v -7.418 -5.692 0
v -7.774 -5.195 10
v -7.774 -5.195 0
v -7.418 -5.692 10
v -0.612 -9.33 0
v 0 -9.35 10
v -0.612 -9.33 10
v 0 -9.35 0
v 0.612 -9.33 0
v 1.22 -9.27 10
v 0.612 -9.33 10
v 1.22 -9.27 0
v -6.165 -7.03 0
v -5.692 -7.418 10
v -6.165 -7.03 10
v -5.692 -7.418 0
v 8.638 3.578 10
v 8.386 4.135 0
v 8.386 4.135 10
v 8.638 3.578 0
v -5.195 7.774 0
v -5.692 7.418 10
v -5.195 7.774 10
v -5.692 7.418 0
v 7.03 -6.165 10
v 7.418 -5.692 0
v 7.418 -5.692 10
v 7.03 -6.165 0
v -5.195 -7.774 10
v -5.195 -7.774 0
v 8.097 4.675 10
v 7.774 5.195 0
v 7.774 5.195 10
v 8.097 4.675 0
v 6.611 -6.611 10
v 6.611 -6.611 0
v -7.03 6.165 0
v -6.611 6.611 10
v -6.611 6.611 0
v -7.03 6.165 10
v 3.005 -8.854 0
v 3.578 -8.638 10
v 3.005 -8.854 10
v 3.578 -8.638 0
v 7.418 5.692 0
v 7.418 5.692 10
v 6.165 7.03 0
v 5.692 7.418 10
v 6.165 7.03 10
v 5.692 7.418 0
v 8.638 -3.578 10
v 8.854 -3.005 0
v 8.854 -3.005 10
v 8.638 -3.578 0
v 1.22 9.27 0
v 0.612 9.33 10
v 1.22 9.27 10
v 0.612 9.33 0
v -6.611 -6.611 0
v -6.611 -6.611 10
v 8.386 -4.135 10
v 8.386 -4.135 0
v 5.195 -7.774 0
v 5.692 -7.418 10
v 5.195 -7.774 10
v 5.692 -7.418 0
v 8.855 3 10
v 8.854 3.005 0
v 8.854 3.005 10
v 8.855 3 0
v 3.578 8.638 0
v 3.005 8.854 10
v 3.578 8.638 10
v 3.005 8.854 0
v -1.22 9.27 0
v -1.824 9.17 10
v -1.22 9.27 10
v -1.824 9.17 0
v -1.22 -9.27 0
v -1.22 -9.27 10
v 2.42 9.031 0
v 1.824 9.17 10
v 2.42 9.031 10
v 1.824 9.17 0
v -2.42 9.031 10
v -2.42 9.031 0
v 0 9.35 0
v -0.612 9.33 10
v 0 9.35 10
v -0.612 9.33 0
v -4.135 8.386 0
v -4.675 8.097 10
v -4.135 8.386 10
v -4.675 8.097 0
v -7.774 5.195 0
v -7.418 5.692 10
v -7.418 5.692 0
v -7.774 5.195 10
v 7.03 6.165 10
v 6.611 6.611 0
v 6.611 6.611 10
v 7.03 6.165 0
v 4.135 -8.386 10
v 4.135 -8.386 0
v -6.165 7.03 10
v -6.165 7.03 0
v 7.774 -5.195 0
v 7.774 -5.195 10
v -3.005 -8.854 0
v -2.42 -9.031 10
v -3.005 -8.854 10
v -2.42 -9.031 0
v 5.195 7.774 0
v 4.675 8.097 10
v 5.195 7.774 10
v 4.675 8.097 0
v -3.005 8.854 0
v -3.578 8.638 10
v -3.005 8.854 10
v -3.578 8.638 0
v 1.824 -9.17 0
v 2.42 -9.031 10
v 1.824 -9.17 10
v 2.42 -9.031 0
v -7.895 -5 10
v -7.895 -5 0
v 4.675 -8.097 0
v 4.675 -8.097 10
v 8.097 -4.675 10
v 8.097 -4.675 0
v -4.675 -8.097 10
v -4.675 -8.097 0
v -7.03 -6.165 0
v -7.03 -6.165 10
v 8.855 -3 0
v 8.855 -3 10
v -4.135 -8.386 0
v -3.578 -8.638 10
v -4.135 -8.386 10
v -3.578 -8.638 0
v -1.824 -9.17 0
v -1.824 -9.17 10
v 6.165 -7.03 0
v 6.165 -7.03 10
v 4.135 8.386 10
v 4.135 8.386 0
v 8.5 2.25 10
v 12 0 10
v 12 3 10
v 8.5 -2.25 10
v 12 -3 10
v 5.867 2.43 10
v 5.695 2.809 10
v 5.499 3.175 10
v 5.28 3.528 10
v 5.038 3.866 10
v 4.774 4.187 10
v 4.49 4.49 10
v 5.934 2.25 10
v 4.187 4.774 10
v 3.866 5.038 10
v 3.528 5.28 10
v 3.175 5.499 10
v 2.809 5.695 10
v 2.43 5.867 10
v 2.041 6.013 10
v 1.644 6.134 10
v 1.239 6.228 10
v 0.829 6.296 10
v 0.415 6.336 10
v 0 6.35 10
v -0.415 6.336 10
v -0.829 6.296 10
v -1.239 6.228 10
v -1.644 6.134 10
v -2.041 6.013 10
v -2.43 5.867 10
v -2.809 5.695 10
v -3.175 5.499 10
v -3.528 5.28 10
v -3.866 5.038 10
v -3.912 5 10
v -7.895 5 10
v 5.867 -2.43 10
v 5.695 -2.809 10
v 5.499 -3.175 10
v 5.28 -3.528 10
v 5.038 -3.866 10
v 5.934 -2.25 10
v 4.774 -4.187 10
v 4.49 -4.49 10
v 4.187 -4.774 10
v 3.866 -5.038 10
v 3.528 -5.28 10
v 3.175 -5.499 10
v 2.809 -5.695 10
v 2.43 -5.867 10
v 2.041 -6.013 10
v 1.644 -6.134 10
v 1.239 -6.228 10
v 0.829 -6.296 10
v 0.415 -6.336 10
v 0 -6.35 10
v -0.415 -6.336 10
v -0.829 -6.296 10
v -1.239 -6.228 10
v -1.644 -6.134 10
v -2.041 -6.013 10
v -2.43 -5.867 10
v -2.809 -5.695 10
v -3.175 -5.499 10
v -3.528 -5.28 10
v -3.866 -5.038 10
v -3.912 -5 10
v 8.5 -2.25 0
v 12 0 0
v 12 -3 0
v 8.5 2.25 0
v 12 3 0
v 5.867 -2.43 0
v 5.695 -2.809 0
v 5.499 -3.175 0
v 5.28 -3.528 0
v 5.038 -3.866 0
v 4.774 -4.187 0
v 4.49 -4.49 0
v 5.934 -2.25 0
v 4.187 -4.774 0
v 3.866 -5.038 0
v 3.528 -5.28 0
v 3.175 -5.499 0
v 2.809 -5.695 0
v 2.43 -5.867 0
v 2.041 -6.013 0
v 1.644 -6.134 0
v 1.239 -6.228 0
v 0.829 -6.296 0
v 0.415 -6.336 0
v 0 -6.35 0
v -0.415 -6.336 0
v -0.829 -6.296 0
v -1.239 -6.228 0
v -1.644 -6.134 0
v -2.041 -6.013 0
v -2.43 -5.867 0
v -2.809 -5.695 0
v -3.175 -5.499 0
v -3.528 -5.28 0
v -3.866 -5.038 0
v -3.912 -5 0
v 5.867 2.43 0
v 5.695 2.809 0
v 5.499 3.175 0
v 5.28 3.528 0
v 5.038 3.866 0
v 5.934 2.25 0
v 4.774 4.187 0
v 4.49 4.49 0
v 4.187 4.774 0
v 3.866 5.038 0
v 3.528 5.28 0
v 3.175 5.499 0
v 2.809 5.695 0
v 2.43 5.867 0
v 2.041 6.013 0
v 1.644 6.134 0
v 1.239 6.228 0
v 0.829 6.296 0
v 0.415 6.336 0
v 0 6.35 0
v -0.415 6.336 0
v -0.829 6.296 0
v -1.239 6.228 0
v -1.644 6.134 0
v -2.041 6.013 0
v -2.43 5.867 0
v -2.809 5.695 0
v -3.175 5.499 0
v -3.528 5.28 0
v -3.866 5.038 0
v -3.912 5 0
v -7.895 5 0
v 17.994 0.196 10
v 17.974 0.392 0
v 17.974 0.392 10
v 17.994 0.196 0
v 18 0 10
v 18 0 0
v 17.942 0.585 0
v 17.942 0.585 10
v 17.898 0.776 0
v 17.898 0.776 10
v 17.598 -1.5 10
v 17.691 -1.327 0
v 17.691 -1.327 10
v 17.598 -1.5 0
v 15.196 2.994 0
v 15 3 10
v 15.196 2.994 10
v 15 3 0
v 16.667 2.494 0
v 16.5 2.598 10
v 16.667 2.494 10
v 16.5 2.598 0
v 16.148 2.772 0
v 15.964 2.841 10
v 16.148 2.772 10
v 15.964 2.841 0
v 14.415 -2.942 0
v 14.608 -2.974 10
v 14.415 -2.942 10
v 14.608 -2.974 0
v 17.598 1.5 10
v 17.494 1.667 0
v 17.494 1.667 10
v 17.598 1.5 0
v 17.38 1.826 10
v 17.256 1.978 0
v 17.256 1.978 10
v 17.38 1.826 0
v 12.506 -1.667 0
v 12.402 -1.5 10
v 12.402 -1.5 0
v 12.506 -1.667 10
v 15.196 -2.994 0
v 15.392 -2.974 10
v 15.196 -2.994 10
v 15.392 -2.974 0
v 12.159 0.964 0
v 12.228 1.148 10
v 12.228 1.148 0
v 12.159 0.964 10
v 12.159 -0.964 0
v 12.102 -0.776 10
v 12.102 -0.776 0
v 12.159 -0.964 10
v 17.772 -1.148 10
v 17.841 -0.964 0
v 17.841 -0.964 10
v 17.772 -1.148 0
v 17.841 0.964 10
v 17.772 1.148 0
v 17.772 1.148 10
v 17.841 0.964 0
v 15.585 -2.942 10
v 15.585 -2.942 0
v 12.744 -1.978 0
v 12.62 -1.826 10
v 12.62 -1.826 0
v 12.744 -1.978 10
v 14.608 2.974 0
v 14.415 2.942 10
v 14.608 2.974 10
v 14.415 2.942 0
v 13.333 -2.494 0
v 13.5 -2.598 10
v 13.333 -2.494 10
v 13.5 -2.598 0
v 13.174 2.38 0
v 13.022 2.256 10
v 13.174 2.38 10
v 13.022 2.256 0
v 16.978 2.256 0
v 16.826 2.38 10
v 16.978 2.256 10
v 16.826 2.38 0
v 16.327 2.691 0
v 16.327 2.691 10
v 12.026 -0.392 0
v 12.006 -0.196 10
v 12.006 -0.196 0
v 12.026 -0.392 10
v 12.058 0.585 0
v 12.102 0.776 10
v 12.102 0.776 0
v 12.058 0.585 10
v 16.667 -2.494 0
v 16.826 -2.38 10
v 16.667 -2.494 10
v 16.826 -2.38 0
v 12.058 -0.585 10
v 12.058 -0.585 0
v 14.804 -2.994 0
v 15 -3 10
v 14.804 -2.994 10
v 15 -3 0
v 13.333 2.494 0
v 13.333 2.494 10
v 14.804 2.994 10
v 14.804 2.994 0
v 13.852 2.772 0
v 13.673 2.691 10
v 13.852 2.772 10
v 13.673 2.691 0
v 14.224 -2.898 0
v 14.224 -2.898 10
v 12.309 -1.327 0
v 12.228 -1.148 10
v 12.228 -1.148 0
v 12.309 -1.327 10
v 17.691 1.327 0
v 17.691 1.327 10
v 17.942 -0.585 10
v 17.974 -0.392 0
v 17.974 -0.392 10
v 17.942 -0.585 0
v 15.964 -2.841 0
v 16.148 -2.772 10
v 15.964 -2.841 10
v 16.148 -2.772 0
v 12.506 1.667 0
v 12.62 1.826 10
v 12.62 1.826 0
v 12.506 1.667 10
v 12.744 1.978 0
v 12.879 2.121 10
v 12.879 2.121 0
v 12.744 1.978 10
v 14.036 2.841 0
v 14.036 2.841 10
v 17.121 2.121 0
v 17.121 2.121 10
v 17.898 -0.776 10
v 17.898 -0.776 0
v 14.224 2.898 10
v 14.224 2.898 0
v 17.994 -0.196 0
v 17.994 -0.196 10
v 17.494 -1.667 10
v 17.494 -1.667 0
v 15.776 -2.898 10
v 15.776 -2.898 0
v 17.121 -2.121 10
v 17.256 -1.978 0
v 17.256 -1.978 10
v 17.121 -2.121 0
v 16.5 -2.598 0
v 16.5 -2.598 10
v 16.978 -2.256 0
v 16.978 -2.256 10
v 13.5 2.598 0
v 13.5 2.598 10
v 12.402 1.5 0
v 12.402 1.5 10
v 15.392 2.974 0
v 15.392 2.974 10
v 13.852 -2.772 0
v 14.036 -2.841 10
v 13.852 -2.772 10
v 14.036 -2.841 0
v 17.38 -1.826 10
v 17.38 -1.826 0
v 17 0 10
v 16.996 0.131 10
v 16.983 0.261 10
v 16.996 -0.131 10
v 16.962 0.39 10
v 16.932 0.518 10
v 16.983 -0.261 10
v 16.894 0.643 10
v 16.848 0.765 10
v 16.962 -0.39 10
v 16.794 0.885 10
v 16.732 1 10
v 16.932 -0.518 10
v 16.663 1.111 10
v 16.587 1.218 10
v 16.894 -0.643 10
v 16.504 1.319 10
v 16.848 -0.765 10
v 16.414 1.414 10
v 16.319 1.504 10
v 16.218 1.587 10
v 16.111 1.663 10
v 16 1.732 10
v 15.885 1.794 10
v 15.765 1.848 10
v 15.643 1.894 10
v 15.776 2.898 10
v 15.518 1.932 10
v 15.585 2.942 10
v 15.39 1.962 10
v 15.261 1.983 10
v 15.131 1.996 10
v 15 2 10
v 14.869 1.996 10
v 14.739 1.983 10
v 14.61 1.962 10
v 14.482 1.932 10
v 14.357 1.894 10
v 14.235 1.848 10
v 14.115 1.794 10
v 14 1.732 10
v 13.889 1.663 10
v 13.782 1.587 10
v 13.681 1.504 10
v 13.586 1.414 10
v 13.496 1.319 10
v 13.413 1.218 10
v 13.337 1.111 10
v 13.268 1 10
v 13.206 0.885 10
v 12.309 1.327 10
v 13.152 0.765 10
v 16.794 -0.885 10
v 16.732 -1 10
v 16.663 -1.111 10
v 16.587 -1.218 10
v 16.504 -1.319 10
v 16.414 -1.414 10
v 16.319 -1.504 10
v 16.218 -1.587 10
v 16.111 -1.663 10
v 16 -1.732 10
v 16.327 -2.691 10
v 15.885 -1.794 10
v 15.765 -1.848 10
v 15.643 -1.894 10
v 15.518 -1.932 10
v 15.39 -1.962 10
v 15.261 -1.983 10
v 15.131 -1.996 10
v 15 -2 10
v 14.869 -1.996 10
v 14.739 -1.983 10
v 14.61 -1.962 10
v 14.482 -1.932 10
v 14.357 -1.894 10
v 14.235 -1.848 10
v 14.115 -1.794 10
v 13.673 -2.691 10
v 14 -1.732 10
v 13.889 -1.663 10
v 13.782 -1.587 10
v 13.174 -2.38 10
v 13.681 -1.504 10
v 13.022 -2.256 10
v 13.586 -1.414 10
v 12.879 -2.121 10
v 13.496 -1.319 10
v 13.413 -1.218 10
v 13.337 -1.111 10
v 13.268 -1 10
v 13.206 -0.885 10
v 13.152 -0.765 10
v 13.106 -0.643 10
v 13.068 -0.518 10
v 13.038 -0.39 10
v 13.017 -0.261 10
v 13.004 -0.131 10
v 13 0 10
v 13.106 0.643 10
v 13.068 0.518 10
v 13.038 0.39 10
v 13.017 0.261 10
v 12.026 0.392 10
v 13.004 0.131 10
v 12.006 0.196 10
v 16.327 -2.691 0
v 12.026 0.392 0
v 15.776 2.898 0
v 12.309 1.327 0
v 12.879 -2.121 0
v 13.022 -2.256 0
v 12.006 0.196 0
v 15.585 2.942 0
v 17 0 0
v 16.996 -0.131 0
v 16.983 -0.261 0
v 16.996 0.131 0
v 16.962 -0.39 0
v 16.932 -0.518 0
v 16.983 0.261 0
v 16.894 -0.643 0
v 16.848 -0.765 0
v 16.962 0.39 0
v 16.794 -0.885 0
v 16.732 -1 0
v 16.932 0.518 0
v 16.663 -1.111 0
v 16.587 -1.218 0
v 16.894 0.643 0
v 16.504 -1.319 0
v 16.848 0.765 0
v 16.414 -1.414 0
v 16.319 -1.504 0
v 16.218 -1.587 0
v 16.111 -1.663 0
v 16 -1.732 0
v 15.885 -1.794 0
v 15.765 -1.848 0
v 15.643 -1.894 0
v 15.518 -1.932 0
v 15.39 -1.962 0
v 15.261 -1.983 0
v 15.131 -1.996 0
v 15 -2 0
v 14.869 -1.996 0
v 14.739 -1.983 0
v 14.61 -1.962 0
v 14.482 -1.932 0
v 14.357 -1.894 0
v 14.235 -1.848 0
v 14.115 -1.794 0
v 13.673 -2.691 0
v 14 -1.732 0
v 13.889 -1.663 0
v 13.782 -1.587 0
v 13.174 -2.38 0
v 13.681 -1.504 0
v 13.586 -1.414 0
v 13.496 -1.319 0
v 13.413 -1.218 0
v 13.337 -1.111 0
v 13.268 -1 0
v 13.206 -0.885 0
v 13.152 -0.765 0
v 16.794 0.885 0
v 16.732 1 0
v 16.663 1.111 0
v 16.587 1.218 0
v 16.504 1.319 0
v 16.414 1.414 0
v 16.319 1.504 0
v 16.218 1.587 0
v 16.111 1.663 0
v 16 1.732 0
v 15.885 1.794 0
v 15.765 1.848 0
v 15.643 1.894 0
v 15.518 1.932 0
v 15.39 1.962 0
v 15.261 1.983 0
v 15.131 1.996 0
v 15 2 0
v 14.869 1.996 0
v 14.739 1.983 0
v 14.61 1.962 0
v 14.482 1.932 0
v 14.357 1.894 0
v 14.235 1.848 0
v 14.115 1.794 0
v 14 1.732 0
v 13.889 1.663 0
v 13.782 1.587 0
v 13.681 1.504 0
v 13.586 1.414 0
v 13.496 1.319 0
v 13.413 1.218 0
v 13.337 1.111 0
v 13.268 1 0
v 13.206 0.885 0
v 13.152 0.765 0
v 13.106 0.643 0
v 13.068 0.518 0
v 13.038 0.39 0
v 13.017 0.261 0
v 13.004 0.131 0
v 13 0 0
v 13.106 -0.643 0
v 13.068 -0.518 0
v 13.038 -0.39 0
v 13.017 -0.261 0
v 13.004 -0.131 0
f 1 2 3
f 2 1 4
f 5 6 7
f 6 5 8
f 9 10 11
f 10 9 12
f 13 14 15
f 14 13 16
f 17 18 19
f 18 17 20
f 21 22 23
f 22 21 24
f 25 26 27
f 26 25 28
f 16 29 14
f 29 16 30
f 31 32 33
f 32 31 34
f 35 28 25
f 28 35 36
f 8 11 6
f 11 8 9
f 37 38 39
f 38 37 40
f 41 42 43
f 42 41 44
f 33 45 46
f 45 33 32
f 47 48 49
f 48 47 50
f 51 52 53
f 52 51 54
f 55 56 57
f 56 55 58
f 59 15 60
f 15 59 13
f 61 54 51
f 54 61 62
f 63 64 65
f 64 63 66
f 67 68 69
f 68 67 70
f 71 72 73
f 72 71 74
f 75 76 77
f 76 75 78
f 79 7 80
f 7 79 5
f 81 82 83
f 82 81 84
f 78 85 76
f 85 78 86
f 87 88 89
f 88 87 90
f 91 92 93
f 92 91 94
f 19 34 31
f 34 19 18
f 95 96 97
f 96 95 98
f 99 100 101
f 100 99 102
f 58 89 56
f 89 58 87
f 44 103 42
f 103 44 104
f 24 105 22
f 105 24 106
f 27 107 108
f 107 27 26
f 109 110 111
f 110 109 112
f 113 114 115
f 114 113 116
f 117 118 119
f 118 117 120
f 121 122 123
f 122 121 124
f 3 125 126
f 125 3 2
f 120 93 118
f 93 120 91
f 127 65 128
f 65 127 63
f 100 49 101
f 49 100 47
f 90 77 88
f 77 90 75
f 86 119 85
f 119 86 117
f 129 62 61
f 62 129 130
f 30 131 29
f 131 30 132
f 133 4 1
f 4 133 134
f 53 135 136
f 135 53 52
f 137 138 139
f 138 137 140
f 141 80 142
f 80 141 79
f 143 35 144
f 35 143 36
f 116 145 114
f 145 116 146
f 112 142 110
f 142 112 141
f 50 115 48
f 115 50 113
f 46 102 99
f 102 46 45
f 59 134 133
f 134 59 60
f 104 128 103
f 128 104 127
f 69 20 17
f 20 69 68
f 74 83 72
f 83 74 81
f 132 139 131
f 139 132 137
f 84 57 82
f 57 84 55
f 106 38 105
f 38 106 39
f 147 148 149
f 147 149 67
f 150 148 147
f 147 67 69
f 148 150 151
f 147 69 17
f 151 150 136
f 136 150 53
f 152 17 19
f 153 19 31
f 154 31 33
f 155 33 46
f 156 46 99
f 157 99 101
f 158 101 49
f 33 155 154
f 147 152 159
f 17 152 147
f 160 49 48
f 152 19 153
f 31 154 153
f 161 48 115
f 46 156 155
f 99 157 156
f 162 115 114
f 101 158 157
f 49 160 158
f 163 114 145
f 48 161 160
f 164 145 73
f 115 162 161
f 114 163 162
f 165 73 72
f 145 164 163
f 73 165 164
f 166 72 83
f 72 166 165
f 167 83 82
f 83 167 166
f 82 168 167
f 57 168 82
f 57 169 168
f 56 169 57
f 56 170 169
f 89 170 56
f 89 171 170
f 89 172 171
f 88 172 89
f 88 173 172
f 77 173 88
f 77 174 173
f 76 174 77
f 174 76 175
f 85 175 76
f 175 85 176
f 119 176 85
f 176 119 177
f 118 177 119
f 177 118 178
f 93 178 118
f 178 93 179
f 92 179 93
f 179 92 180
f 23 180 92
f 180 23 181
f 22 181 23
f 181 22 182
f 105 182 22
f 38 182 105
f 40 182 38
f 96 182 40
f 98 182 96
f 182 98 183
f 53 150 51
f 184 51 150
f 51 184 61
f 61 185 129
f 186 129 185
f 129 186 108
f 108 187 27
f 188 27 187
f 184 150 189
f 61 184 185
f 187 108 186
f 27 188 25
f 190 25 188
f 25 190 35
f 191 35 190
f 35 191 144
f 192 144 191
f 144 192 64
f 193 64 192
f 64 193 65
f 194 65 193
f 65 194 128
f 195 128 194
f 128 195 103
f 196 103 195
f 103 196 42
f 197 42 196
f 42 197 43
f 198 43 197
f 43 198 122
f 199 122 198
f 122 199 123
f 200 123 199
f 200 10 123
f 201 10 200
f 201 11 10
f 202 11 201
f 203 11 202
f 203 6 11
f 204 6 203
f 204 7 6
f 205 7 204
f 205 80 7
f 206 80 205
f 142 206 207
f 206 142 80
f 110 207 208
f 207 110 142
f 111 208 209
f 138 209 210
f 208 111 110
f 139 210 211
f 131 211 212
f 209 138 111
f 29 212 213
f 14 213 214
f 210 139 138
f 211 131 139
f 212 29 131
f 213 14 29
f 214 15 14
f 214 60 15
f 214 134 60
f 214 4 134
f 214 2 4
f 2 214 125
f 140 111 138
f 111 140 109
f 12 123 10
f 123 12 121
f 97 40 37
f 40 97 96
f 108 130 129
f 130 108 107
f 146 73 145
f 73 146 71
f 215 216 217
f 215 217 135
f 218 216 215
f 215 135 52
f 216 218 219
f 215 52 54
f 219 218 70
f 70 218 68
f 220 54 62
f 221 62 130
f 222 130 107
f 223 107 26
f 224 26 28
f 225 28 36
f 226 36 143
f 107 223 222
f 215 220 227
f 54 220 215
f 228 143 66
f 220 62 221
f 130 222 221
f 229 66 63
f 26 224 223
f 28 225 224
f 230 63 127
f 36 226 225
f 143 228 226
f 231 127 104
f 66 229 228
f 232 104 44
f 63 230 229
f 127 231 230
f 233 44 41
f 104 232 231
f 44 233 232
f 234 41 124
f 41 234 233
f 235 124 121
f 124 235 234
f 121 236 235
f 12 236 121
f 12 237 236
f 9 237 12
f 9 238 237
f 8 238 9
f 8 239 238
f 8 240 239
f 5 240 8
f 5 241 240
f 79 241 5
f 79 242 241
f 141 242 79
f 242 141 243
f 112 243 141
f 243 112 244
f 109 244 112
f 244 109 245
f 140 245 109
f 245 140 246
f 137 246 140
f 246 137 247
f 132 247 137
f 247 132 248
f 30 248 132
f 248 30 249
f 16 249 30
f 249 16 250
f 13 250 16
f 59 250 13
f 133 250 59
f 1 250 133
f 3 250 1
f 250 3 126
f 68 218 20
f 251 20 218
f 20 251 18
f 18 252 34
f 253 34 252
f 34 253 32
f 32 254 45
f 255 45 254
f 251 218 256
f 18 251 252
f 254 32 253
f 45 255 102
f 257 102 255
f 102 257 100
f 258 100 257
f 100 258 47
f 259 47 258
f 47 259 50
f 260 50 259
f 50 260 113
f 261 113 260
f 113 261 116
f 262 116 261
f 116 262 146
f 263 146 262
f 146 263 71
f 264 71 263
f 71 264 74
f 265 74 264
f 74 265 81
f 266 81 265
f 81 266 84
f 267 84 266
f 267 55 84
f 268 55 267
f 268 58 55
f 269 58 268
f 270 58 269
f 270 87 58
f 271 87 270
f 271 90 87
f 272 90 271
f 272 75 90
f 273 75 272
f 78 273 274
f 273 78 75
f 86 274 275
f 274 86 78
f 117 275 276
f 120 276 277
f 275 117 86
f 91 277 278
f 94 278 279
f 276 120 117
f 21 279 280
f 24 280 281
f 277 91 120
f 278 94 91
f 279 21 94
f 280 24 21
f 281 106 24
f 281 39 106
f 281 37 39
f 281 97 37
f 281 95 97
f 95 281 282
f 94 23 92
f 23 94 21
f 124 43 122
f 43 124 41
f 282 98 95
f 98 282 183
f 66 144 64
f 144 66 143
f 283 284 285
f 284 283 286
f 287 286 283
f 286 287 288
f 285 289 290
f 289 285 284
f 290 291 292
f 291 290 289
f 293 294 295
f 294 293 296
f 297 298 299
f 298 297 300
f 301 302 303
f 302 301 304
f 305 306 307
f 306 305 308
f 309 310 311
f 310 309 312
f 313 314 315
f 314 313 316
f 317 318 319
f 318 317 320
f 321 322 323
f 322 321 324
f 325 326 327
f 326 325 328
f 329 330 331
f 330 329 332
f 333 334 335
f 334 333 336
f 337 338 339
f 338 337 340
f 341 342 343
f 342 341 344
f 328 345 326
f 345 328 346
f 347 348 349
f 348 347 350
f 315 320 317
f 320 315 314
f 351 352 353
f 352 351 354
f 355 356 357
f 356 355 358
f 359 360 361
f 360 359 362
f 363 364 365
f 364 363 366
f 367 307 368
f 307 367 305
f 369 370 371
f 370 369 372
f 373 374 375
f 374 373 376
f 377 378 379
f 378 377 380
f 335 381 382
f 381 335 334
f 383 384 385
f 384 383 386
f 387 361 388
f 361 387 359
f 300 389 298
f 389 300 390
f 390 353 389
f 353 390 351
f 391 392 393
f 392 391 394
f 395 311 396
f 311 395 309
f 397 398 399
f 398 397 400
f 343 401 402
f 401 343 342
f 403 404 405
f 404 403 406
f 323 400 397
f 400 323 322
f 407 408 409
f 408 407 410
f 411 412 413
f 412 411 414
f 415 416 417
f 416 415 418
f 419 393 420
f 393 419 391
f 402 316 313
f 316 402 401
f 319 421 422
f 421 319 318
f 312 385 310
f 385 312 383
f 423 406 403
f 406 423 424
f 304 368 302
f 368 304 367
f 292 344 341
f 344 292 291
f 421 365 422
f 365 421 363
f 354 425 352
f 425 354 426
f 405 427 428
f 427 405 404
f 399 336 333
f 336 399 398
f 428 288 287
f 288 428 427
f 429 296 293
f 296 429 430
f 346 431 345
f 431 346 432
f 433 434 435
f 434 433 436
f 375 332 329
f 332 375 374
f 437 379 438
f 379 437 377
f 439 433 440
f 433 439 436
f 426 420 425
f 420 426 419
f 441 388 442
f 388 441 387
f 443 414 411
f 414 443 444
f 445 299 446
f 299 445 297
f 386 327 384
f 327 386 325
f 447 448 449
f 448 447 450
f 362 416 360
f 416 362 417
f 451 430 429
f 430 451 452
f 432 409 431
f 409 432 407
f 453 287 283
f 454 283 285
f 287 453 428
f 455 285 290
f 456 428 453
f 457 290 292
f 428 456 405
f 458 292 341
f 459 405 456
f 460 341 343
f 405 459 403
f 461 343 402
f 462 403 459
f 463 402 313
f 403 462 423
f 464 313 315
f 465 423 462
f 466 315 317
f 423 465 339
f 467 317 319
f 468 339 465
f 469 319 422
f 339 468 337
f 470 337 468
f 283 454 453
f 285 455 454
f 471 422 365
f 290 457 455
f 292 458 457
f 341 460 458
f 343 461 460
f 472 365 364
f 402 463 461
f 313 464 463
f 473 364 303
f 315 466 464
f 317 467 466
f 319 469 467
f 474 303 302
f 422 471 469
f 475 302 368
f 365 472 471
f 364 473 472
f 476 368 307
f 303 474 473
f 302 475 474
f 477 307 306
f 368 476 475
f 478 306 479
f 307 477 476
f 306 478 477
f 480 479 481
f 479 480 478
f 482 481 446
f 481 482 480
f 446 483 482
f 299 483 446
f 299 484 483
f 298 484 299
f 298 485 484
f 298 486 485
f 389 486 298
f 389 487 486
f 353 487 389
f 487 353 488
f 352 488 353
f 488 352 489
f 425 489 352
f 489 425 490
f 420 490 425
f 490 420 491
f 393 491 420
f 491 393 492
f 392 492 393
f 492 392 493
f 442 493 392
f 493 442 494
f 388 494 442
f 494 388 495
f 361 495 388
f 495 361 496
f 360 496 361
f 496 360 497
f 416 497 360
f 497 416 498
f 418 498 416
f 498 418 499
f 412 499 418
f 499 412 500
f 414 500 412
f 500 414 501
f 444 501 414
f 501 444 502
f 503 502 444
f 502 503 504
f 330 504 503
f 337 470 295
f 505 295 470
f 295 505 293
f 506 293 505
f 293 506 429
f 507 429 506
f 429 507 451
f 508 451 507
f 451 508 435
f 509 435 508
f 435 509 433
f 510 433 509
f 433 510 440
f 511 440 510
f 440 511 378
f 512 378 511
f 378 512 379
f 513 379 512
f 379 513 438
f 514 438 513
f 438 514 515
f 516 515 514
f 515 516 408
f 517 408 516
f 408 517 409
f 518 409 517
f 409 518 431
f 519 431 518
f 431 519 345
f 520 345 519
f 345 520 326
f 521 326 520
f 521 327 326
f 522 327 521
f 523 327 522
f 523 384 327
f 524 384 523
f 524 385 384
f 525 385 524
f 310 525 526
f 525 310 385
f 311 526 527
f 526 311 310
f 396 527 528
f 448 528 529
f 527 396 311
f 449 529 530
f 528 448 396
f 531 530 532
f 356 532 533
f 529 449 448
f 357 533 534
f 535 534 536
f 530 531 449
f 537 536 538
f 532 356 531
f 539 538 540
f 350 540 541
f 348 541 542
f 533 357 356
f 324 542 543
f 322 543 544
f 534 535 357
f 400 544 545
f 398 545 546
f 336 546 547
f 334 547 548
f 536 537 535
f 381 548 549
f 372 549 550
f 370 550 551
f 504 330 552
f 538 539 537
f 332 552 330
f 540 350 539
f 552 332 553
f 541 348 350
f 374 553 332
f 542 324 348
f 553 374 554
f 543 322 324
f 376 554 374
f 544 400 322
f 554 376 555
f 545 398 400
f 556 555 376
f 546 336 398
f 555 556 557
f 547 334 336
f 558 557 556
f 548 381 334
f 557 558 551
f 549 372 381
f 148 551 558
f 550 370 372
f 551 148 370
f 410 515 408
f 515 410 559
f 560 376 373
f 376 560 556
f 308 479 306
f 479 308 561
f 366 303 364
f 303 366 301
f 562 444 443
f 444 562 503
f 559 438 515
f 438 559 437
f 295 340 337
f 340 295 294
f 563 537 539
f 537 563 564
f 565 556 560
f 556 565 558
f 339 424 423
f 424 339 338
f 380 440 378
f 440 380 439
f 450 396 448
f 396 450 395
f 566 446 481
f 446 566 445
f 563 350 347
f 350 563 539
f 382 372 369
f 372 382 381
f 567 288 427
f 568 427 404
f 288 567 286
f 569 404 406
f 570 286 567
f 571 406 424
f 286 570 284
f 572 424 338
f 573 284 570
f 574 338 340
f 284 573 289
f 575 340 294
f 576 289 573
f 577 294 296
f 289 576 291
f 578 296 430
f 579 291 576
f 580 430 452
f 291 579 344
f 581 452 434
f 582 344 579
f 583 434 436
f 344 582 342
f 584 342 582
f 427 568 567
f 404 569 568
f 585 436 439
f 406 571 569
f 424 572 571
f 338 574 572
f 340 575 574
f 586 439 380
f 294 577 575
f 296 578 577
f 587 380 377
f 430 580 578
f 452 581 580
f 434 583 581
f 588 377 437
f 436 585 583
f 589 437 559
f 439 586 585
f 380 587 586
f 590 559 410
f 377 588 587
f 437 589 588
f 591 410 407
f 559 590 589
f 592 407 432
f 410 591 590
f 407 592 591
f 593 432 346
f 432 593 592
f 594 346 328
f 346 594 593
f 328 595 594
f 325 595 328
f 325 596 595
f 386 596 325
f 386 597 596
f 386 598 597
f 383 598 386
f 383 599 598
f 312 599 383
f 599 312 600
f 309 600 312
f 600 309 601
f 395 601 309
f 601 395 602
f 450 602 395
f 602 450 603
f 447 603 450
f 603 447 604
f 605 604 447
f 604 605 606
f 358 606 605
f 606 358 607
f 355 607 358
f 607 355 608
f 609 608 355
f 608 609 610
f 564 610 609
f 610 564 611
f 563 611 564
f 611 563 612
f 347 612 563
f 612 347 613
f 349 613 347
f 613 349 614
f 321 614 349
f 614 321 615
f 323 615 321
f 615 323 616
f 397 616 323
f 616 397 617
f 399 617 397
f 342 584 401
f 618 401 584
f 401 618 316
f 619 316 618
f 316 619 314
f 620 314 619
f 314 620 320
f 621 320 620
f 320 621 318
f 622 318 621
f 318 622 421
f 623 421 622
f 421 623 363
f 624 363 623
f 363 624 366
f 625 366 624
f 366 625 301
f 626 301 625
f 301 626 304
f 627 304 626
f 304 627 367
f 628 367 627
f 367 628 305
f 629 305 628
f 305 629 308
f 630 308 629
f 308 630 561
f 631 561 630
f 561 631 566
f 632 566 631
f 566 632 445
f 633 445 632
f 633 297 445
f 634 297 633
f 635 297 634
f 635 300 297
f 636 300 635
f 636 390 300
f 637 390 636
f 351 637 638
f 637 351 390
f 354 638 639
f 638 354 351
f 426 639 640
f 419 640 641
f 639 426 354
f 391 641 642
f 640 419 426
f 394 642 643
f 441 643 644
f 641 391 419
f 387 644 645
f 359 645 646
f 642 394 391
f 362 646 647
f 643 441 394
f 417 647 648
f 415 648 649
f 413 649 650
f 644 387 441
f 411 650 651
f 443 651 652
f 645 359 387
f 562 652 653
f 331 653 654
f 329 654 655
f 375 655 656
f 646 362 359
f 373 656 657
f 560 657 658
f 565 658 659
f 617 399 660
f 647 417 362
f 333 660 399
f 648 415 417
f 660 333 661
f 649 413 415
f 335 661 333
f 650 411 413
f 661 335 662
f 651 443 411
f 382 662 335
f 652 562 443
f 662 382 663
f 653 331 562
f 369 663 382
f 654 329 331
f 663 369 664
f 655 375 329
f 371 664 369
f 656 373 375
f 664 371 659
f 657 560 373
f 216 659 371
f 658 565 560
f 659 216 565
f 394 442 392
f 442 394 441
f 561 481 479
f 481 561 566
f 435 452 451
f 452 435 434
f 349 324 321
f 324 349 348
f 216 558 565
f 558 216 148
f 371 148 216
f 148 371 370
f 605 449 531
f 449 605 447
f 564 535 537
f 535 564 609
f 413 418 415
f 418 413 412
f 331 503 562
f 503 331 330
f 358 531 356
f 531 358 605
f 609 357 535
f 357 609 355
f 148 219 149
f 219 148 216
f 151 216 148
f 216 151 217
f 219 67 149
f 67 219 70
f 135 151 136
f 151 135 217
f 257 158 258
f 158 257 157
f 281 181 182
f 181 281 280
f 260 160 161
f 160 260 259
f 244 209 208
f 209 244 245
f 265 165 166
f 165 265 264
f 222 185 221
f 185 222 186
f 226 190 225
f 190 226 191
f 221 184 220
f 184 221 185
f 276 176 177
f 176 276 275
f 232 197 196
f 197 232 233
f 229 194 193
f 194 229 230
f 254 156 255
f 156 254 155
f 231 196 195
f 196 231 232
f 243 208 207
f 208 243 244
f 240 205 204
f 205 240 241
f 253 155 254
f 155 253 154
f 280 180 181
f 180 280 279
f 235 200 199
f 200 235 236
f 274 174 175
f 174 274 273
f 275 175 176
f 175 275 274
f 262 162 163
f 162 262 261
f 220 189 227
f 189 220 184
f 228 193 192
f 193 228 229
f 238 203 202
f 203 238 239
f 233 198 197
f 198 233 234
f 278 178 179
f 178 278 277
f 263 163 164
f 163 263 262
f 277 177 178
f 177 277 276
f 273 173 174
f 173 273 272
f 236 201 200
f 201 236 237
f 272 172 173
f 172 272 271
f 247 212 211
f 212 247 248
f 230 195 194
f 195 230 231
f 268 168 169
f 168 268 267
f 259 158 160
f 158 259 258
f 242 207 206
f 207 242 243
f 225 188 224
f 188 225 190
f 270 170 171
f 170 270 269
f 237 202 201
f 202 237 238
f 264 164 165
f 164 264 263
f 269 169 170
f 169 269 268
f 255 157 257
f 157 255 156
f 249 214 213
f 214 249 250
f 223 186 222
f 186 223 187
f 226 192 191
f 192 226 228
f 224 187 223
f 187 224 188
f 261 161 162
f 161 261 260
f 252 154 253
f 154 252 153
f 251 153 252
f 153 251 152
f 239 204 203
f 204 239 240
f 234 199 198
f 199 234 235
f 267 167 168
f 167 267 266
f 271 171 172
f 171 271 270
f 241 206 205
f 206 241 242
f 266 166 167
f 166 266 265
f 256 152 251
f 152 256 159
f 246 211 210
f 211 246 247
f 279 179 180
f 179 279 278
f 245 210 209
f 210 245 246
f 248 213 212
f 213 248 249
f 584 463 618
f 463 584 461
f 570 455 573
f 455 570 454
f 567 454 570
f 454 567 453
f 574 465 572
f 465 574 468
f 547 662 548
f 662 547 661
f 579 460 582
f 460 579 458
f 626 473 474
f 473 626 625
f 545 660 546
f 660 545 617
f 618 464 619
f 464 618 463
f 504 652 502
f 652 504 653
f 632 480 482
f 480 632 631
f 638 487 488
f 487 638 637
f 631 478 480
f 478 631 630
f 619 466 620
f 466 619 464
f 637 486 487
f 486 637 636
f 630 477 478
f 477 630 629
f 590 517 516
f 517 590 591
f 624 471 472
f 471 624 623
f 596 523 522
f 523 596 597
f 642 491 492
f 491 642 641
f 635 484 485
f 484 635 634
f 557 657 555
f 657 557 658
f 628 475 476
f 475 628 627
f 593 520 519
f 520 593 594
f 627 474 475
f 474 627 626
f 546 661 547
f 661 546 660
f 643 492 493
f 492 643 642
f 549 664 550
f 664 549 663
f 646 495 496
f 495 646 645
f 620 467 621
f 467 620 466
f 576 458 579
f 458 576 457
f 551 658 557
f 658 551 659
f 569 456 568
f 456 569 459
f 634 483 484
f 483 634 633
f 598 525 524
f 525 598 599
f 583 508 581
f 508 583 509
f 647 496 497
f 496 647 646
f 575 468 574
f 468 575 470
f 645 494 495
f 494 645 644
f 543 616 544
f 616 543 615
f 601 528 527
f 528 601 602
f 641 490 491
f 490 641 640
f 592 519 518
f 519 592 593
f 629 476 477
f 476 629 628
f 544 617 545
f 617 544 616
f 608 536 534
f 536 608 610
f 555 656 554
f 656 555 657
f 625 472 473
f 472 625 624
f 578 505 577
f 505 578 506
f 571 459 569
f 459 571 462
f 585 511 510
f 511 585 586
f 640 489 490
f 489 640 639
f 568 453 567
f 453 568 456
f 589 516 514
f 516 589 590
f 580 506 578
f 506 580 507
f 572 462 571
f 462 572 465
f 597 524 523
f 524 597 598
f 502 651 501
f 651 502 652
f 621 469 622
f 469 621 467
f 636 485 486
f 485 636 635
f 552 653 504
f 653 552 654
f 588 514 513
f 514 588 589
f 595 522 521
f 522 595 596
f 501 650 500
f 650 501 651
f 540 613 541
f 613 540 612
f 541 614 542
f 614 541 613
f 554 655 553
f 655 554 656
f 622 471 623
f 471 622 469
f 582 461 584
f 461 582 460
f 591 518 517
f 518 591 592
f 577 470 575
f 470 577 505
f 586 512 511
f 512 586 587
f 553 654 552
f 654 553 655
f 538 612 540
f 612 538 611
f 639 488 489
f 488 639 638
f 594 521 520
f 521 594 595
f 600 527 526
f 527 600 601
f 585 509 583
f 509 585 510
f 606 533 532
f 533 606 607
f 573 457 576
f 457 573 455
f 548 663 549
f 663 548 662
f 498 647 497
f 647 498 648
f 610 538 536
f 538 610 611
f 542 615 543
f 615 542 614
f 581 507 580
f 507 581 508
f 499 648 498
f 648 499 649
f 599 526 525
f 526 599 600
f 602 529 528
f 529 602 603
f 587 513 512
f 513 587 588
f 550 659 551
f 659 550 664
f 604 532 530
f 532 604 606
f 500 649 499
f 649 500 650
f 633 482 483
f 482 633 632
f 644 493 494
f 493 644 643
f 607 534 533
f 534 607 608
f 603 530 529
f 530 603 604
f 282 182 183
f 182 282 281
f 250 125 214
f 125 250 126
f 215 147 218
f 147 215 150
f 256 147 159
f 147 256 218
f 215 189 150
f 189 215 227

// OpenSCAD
// Tubing clip for 12.7 mm lab stand rod
// Print orientation: flat on bed, extruded upward in +Z

// ---------- Parameters ----------
ring_od        = 18.7;   // rod ring outer diameter
ring_id        = 12.7;   // rod ring inner diameter (rod bore)
ring_wall      = 3;      // rod ring wall thickness
ring_open      = 10;     // rod ring opening width (along -X)

tube_od        = 6;      // tubing ring outer diameter
tube_id        = 4;      // tubing ring inner diameter (6 mm tube + 2 mm wall)
tube_wall      = 2;      // tubing ring wall thickness
tube_open      = 4.5;    // tubing ring opening width (along +X)

bridge_x0      = 8;      // bridge start (X)
bridge_x1      = 12;     // bridge end (X)
bridge_w       = 6;      // bridge width (Y)

eps            = 0.5;    // cutter overshoot past faces
$fn            = 96;     // curve resolution

// ---------- Derived ----------
ring_r = ring_od / 2;
tube_r = tube_od / 2;

// ---------- Model ----------
difference() {
    union() {
        // Rod ring
        cylinder(h = 10, r = ring_r);
        // Tubing ring
        translate([15, 0, 0])
            cylinder(h = 10, r = tube_r);
        // Bridge
        translate([bridge_x0, -bridge_w / 2, 0])
            cube([bridge_x1 - bridge_x0, bridge_w, 10]);
    }
    // Rod bore
    translate([0, 0, -eps])
        cylinder(h = 10 + 2 * eps, d = ring_id);
    // Tubing bore
    translate([15, 0, -eps])
        cylinder(h = 10 + 2 * eps, d = tube_id);
    // Rod ring opening (-X side)
    translate([-ring_r, -ring_open / 2, -eps])
        cube([ring_open + 2 * eps, ring_open, 10 + 2 * eps]);
    // Tubing ring opening (+X side)
    translate([tube_r, -tube_open / 2, -eps])
        cube([tube_open + 2 * eps, tube_open, 10 + 2 * eps]);
}
